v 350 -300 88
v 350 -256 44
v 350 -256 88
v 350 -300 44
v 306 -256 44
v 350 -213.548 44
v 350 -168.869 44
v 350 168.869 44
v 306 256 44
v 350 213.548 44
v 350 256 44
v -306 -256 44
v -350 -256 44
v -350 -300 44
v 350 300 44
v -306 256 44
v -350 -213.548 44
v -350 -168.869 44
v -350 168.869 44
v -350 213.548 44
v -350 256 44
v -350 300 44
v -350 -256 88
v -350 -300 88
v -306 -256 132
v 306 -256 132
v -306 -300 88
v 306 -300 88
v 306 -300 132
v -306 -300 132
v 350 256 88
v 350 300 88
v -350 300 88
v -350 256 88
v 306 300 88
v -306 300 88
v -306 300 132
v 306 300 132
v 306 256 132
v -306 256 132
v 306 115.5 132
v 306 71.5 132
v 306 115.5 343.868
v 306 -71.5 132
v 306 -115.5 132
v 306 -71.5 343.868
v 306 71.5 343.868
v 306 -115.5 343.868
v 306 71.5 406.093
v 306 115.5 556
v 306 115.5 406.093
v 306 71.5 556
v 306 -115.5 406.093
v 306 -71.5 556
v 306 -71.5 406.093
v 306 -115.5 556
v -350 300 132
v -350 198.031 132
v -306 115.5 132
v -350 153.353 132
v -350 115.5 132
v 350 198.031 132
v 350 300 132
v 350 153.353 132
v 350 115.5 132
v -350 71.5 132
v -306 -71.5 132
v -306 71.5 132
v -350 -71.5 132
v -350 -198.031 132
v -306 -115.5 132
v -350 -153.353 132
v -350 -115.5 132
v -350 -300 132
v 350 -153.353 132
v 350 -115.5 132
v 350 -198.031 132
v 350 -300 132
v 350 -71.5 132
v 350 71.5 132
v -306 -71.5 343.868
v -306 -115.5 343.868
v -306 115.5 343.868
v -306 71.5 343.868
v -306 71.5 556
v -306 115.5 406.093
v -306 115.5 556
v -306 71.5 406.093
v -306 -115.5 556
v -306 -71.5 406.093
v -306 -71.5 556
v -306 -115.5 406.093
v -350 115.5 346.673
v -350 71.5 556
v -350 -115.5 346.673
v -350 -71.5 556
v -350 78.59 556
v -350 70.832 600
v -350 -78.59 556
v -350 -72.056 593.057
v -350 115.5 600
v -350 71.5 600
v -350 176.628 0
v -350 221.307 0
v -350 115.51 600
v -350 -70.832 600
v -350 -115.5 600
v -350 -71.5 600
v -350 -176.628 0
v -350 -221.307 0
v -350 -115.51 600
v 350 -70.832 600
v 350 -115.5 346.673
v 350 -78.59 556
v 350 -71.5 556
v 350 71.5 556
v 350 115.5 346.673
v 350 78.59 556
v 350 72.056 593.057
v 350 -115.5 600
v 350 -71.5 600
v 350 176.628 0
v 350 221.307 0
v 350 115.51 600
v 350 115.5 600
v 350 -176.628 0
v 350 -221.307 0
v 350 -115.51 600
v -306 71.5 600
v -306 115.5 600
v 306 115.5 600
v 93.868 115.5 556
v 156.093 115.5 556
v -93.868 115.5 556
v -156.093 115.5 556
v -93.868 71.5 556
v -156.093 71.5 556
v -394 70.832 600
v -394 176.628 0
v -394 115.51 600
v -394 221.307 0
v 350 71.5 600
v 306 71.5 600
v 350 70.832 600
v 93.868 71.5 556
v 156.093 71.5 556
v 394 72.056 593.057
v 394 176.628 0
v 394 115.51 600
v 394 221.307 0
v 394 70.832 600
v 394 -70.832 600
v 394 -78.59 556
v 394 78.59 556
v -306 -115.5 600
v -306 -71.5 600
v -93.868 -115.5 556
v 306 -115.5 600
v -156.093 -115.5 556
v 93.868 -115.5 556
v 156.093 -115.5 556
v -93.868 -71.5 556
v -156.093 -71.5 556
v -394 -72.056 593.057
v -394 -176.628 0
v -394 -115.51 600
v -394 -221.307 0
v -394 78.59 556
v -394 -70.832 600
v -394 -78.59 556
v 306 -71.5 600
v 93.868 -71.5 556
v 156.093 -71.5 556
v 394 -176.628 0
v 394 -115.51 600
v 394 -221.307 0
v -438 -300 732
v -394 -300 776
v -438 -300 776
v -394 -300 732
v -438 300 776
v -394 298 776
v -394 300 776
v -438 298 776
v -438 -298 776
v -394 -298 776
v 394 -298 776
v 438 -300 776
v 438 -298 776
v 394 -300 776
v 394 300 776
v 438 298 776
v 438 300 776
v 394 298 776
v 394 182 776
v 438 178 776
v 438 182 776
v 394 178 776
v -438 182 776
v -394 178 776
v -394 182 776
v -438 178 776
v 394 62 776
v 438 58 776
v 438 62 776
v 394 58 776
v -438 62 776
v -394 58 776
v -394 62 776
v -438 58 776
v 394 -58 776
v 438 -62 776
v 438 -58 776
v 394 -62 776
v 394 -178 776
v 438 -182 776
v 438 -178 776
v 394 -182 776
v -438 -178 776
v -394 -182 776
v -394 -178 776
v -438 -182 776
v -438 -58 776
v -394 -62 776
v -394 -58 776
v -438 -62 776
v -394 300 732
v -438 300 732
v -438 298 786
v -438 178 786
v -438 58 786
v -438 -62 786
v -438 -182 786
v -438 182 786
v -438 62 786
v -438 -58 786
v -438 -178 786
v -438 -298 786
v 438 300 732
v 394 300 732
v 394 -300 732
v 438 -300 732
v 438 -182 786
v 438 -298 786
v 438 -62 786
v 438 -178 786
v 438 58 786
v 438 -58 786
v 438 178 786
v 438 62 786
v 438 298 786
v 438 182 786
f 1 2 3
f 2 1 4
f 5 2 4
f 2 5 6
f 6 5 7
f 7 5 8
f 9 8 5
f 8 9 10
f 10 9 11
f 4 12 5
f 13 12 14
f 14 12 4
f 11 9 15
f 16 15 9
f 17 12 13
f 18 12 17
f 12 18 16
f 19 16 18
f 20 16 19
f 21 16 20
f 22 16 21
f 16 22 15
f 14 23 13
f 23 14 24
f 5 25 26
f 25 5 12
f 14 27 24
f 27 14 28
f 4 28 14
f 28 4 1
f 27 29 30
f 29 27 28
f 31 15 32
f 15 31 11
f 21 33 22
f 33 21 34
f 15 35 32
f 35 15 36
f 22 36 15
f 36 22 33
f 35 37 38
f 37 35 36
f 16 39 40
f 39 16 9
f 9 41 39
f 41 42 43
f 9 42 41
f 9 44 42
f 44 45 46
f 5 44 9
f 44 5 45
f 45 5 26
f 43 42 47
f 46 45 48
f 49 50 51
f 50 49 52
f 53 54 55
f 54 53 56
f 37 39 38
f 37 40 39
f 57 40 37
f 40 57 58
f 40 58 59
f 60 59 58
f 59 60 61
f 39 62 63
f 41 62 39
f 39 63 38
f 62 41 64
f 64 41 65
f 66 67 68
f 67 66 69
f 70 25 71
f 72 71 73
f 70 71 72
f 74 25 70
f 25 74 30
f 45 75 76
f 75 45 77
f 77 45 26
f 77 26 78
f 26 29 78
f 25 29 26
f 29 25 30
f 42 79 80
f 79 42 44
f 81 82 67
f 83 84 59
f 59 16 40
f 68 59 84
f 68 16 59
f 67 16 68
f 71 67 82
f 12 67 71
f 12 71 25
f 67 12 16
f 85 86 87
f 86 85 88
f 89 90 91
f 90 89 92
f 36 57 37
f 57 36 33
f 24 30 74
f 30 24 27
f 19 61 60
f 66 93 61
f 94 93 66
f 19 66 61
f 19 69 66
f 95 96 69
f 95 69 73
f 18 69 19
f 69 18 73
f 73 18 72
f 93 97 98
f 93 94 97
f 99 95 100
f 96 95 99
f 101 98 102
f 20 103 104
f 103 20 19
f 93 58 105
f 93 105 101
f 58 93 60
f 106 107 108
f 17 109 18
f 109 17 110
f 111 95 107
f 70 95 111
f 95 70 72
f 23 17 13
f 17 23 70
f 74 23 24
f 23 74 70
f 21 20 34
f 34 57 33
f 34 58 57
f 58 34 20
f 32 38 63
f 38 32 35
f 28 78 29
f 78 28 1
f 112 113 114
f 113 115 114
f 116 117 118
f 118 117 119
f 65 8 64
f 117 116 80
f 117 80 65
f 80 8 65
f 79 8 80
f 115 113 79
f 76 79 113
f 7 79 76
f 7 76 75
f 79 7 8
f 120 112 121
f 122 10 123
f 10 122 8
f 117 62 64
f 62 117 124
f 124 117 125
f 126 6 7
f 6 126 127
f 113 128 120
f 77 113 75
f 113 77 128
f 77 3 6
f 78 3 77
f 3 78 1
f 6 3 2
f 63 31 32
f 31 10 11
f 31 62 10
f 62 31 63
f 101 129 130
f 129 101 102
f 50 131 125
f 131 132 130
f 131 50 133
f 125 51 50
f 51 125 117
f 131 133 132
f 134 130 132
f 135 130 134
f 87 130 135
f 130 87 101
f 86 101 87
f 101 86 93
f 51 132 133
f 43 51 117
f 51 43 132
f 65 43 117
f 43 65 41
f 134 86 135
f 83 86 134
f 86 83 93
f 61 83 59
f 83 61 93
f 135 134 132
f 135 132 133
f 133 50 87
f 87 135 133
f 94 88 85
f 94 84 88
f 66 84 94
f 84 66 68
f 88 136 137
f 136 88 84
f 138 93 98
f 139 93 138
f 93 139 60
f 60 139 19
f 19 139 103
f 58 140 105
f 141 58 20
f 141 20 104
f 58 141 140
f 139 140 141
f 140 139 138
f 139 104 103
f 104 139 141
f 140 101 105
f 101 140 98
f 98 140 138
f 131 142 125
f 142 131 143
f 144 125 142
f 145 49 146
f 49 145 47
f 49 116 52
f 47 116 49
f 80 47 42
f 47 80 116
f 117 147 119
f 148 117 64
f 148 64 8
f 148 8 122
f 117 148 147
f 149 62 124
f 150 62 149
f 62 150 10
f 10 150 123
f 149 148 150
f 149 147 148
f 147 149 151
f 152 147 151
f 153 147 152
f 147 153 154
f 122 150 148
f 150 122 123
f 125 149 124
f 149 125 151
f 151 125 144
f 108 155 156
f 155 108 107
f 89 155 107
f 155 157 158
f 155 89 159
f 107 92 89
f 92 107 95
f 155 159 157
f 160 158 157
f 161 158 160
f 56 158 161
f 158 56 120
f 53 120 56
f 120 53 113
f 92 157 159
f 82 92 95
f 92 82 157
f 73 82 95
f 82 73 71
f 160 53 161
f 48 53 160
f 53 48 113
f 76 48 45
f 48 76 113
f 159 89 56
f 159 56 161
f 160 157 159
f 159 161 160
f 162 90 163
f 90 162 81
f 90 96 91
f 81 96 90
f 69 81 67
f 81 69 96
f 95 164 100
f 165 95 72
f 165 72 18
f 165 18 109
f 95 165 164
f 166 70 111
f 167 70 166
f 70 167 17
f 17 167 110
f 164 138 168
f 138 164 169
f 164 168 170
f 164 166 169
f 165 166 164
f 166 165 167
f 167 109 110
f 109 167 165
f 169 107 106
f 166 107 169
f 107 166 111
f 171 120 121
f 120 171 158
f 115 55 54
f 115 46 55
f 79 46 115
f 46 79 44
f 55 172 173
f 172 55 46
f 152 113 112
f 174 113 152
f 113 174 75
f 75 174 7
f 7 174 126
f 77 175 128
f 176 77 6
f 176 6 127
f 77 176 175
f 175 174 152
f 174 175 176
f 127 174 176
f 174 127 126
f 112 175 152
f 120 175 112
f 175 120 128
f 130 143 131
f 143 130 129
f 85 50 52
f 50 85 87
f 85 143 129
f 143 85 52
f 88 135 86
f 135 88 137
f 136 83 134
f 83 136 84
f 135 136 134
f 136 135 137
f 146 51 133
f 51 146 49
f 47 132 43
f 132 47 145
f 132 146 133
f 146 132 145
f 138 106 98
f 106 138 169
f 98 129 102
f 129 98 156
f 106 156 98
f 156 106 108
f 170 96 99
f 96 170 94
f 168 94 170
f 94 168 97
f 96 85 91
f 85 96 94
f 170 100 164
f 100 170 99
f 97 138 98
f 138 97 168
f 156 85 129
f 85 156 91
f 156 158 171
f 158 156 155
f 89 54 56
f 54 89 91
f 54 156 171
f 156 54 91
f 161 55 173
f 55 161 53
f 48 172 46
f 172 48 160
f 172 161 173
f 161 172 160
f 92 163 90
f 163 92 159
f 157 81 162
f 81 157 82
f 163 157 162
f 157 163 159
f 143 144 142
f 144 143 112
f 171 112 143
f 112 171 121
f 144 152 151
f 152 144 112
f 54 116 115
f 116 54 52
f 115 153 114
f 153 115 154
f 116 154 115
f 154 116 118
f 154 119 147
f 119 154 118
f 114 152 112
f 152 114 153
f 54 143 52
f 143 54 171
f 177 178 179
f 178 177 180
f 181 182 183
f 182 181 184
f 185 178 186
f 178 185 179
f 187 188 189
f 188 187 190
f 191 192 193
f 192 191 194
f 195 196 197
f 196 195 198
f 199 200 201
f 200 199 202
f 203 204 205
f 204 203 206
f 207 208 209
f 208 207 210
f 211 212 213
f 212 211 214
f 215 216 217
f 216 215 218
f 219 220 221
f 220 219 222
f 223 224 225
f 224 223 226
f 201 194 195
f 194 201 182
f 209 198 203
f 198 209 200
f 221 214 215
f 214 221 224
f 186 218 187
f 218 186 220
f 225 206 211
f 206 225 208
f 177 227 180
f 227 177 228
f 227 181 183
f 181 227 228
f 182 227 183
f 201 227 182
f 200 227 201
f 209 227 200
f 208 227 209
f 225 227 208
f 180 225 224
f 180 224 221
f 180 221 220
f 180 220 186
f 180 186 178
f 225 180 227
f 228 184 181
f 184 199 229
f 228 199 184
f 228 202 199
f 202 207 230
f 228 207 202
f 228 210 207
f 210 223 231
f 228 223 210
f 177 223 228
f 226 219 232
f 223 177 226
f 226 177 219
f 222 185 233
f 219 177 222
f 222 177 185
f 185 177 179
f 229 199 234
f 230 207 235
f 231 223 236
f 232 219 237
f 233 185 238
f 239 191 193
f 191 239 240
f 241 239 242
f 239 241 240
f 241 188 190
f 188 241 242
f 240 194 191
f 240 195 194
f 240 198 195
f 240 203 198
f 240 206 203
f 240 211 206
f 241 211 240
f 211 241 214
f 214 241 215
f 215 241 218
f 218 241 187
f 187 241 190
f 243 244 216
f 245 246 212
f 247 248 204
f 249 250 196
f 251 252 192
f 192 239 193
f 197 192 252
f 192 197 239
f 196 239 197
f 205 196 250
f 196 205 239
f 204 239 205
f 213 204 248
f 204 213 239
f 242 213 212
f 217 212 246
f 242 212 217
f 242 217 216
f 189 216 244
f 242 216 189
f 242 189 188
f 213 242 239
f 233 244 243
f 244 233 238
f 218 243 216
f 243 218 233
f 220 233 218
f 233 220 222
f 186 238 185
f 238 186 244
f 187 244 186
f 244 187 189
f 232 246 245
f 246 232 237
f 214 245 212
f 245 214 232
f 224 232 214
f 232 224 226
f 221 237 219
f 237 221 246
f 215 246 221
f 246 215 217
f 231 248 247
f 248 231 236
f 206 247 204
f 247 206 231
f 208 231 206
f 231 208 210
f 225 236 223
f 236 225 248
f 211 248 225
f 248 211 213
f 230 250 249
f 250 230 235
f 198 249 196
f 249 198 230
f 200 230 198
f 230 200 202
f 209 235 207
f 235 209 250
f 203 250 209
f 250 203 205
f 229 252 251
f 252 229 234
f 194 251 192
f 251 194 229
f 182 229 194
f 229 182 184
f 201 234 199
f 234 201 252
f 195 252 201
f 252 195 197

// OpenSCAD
W=44;
gap=143;
ang=10;
width=700;
depth=600;
height=600;
strut=300;

module Part(length, angle1=0, angle2=0, angle3=0) {
	echo(str("PART L=", length, " A=(", angle1, ", ", angle2, ", ", angle3, ")"));
	render() difference() {
		cube([length, W, W]);
		rotate([0, angle1, 0])
			translate([-2*W, -W/2, -W/2])
			cube([2*W, 2*W, W+W/cos(angle1)]);
		translate([length, W/2, W/2])
			rotate([angle3, 0, 0])
			translate([0, -W/2, -W/2])
			rotate([0, -angle2, 0])
			translate([0, -W/2, -W/2])
			cube([2*W, 2*W, W+W/cos(angle2)]);
	}
}


module BottomFrame() {
	translate([-width/2, -depth/2, W]) {
		color([1.0, 0.3, 0.4]) {
			Part(width);
			translate([0, depth-W, 0]) Part(width);
		}
		color([0.3, 1.0, 0.4]) {
			translate([W, 0, W]) Part(width-2*W);
			translate([W, depth-W, W]) Part(width-2*W);
		}
		color([0.3, 0.4, 1.0]) {
			translate([W, 0, W]) rotate([0, 0, 90]) Part(depth);
			translate([width, 0, W]) rotate([0, 0, 90]) Part(depth);
		}
		color([0.3, 1.0, 0.4]) {
			translate([W, W, 0]) rotate([0, 0, 90]) Part(depth-2*W);
			translate([width, W, 0]) rotate([0, 0, 90]) Part(depth-2*W);
		}
	}
}

module Leg() {
	color([1.0, 0.3, 0.4])
		translate([-width/2+W, gap/2, 3*W])
		rotate([0, -90, 0])
		Part(height-3*W);
	
	color([0.3, 0.8, 0.8])
		translate([-width/2, W/cos(ang) + gap/2 + height*tan(ang) - W*(1-cos(ang)), 0])
		rotate([ang, 0, 0])
		rotate([0, -90, 90])
		Part((height+W*sin(ang))/cos(ang), ang, ang, 180);
	
}

module Legs() {
	Leg();
	mirror([1, 0, 0]) Leg();
	mirror([0, 1, 0]) Leg();
	rotate([0, 0, 180]) Leg();
}

module TopFrame_Variant1() {
	color([0.3, 1.0, 0.4])
		translate([-width/2+W, gap/2, height-W])
		Part(width-2*W);
	module S() {
		color([0.3, 0.4, 1.0])
			translate([-width/2+W, gap/2, height - strut*sin(45)-W])
			rotate([0, -45, 0])
			Part(strut, 45, 45);
	}
	S();
	mirror([1, 0, 0]) S();

	color([0.3, 0.4, 1.0])
		let(len = gap - 2*W*(1-cos(ang)) + 2*W*tan(ang))
		translate([-width/2, -len/2, height-W])
		rotate([0, 0, 90])
		Part(len, ang, ang);

	color([0.3, 1.0, 0.4])
		translate([-width/2+W, -gap/2, height-W])
		rotate([0, 0, 90])
		Part(gap);
}

module TopFrameHalve() {
	color([0.3, 1.0, 0.4])
		translate([-width/2+W, gap/2, height-W])
		Part(width-2*W);
	module S() {
		color([0.3, 0.4, 1.0])
			translate([-width/2+W, gap/2, height - strut*sin(45)-W])
			rotate([0, -45, 0])
			Part(strut, 45, 45);
	}
	S();
	mirror([1, 0, 0]) S();

	color([0.3, 0.4, 1.0])
		let(len = gap - 2*W*(1-cos(ang)) + 2*W*tan(ang))
		translate([-width/2, -len/2, height-W])
		rotate([0, 0, 90])
		Part(len, ang, ang);

	color([0.3, 1.0, 0.4])
		translate([-width/2+W, -gap/2, height-W])
		rotate([0, 0, 90])
		Part(gap);
}

module TopFrame() {
	TopFrameHalve();
	rotate([0, 0, 180]) TopFrameHalve();
}

module TableTop() {
	for (a = [0, 180]) rotate([0, 0, a]) {
		color([0.3, 1.0, 0.4])
			translate([-width/2 - 2*W, depth/2, height - W])
			rotate([0, 0, -90])
			Part(depth);

		// color([0.3, 0.4, 1.0])
		// 	translate([-width/2 + W, gap/2-W, height - W])
		// 	Part(width - 2*W);
	}

	for (i = [-2, -1, 0, 1, 2]) {
		color([0.5, 0.6, 0.8])
			translate([-width/2 - 2*W, -depth/10 + i*(depth/5) + 2, height])
			cube([width + 4*W, depth/5 - 4, 10]);
	}
}

BottomFrame();
Legs();
TopFrame();

translate([0, 0, 4*W]) TableTop();
